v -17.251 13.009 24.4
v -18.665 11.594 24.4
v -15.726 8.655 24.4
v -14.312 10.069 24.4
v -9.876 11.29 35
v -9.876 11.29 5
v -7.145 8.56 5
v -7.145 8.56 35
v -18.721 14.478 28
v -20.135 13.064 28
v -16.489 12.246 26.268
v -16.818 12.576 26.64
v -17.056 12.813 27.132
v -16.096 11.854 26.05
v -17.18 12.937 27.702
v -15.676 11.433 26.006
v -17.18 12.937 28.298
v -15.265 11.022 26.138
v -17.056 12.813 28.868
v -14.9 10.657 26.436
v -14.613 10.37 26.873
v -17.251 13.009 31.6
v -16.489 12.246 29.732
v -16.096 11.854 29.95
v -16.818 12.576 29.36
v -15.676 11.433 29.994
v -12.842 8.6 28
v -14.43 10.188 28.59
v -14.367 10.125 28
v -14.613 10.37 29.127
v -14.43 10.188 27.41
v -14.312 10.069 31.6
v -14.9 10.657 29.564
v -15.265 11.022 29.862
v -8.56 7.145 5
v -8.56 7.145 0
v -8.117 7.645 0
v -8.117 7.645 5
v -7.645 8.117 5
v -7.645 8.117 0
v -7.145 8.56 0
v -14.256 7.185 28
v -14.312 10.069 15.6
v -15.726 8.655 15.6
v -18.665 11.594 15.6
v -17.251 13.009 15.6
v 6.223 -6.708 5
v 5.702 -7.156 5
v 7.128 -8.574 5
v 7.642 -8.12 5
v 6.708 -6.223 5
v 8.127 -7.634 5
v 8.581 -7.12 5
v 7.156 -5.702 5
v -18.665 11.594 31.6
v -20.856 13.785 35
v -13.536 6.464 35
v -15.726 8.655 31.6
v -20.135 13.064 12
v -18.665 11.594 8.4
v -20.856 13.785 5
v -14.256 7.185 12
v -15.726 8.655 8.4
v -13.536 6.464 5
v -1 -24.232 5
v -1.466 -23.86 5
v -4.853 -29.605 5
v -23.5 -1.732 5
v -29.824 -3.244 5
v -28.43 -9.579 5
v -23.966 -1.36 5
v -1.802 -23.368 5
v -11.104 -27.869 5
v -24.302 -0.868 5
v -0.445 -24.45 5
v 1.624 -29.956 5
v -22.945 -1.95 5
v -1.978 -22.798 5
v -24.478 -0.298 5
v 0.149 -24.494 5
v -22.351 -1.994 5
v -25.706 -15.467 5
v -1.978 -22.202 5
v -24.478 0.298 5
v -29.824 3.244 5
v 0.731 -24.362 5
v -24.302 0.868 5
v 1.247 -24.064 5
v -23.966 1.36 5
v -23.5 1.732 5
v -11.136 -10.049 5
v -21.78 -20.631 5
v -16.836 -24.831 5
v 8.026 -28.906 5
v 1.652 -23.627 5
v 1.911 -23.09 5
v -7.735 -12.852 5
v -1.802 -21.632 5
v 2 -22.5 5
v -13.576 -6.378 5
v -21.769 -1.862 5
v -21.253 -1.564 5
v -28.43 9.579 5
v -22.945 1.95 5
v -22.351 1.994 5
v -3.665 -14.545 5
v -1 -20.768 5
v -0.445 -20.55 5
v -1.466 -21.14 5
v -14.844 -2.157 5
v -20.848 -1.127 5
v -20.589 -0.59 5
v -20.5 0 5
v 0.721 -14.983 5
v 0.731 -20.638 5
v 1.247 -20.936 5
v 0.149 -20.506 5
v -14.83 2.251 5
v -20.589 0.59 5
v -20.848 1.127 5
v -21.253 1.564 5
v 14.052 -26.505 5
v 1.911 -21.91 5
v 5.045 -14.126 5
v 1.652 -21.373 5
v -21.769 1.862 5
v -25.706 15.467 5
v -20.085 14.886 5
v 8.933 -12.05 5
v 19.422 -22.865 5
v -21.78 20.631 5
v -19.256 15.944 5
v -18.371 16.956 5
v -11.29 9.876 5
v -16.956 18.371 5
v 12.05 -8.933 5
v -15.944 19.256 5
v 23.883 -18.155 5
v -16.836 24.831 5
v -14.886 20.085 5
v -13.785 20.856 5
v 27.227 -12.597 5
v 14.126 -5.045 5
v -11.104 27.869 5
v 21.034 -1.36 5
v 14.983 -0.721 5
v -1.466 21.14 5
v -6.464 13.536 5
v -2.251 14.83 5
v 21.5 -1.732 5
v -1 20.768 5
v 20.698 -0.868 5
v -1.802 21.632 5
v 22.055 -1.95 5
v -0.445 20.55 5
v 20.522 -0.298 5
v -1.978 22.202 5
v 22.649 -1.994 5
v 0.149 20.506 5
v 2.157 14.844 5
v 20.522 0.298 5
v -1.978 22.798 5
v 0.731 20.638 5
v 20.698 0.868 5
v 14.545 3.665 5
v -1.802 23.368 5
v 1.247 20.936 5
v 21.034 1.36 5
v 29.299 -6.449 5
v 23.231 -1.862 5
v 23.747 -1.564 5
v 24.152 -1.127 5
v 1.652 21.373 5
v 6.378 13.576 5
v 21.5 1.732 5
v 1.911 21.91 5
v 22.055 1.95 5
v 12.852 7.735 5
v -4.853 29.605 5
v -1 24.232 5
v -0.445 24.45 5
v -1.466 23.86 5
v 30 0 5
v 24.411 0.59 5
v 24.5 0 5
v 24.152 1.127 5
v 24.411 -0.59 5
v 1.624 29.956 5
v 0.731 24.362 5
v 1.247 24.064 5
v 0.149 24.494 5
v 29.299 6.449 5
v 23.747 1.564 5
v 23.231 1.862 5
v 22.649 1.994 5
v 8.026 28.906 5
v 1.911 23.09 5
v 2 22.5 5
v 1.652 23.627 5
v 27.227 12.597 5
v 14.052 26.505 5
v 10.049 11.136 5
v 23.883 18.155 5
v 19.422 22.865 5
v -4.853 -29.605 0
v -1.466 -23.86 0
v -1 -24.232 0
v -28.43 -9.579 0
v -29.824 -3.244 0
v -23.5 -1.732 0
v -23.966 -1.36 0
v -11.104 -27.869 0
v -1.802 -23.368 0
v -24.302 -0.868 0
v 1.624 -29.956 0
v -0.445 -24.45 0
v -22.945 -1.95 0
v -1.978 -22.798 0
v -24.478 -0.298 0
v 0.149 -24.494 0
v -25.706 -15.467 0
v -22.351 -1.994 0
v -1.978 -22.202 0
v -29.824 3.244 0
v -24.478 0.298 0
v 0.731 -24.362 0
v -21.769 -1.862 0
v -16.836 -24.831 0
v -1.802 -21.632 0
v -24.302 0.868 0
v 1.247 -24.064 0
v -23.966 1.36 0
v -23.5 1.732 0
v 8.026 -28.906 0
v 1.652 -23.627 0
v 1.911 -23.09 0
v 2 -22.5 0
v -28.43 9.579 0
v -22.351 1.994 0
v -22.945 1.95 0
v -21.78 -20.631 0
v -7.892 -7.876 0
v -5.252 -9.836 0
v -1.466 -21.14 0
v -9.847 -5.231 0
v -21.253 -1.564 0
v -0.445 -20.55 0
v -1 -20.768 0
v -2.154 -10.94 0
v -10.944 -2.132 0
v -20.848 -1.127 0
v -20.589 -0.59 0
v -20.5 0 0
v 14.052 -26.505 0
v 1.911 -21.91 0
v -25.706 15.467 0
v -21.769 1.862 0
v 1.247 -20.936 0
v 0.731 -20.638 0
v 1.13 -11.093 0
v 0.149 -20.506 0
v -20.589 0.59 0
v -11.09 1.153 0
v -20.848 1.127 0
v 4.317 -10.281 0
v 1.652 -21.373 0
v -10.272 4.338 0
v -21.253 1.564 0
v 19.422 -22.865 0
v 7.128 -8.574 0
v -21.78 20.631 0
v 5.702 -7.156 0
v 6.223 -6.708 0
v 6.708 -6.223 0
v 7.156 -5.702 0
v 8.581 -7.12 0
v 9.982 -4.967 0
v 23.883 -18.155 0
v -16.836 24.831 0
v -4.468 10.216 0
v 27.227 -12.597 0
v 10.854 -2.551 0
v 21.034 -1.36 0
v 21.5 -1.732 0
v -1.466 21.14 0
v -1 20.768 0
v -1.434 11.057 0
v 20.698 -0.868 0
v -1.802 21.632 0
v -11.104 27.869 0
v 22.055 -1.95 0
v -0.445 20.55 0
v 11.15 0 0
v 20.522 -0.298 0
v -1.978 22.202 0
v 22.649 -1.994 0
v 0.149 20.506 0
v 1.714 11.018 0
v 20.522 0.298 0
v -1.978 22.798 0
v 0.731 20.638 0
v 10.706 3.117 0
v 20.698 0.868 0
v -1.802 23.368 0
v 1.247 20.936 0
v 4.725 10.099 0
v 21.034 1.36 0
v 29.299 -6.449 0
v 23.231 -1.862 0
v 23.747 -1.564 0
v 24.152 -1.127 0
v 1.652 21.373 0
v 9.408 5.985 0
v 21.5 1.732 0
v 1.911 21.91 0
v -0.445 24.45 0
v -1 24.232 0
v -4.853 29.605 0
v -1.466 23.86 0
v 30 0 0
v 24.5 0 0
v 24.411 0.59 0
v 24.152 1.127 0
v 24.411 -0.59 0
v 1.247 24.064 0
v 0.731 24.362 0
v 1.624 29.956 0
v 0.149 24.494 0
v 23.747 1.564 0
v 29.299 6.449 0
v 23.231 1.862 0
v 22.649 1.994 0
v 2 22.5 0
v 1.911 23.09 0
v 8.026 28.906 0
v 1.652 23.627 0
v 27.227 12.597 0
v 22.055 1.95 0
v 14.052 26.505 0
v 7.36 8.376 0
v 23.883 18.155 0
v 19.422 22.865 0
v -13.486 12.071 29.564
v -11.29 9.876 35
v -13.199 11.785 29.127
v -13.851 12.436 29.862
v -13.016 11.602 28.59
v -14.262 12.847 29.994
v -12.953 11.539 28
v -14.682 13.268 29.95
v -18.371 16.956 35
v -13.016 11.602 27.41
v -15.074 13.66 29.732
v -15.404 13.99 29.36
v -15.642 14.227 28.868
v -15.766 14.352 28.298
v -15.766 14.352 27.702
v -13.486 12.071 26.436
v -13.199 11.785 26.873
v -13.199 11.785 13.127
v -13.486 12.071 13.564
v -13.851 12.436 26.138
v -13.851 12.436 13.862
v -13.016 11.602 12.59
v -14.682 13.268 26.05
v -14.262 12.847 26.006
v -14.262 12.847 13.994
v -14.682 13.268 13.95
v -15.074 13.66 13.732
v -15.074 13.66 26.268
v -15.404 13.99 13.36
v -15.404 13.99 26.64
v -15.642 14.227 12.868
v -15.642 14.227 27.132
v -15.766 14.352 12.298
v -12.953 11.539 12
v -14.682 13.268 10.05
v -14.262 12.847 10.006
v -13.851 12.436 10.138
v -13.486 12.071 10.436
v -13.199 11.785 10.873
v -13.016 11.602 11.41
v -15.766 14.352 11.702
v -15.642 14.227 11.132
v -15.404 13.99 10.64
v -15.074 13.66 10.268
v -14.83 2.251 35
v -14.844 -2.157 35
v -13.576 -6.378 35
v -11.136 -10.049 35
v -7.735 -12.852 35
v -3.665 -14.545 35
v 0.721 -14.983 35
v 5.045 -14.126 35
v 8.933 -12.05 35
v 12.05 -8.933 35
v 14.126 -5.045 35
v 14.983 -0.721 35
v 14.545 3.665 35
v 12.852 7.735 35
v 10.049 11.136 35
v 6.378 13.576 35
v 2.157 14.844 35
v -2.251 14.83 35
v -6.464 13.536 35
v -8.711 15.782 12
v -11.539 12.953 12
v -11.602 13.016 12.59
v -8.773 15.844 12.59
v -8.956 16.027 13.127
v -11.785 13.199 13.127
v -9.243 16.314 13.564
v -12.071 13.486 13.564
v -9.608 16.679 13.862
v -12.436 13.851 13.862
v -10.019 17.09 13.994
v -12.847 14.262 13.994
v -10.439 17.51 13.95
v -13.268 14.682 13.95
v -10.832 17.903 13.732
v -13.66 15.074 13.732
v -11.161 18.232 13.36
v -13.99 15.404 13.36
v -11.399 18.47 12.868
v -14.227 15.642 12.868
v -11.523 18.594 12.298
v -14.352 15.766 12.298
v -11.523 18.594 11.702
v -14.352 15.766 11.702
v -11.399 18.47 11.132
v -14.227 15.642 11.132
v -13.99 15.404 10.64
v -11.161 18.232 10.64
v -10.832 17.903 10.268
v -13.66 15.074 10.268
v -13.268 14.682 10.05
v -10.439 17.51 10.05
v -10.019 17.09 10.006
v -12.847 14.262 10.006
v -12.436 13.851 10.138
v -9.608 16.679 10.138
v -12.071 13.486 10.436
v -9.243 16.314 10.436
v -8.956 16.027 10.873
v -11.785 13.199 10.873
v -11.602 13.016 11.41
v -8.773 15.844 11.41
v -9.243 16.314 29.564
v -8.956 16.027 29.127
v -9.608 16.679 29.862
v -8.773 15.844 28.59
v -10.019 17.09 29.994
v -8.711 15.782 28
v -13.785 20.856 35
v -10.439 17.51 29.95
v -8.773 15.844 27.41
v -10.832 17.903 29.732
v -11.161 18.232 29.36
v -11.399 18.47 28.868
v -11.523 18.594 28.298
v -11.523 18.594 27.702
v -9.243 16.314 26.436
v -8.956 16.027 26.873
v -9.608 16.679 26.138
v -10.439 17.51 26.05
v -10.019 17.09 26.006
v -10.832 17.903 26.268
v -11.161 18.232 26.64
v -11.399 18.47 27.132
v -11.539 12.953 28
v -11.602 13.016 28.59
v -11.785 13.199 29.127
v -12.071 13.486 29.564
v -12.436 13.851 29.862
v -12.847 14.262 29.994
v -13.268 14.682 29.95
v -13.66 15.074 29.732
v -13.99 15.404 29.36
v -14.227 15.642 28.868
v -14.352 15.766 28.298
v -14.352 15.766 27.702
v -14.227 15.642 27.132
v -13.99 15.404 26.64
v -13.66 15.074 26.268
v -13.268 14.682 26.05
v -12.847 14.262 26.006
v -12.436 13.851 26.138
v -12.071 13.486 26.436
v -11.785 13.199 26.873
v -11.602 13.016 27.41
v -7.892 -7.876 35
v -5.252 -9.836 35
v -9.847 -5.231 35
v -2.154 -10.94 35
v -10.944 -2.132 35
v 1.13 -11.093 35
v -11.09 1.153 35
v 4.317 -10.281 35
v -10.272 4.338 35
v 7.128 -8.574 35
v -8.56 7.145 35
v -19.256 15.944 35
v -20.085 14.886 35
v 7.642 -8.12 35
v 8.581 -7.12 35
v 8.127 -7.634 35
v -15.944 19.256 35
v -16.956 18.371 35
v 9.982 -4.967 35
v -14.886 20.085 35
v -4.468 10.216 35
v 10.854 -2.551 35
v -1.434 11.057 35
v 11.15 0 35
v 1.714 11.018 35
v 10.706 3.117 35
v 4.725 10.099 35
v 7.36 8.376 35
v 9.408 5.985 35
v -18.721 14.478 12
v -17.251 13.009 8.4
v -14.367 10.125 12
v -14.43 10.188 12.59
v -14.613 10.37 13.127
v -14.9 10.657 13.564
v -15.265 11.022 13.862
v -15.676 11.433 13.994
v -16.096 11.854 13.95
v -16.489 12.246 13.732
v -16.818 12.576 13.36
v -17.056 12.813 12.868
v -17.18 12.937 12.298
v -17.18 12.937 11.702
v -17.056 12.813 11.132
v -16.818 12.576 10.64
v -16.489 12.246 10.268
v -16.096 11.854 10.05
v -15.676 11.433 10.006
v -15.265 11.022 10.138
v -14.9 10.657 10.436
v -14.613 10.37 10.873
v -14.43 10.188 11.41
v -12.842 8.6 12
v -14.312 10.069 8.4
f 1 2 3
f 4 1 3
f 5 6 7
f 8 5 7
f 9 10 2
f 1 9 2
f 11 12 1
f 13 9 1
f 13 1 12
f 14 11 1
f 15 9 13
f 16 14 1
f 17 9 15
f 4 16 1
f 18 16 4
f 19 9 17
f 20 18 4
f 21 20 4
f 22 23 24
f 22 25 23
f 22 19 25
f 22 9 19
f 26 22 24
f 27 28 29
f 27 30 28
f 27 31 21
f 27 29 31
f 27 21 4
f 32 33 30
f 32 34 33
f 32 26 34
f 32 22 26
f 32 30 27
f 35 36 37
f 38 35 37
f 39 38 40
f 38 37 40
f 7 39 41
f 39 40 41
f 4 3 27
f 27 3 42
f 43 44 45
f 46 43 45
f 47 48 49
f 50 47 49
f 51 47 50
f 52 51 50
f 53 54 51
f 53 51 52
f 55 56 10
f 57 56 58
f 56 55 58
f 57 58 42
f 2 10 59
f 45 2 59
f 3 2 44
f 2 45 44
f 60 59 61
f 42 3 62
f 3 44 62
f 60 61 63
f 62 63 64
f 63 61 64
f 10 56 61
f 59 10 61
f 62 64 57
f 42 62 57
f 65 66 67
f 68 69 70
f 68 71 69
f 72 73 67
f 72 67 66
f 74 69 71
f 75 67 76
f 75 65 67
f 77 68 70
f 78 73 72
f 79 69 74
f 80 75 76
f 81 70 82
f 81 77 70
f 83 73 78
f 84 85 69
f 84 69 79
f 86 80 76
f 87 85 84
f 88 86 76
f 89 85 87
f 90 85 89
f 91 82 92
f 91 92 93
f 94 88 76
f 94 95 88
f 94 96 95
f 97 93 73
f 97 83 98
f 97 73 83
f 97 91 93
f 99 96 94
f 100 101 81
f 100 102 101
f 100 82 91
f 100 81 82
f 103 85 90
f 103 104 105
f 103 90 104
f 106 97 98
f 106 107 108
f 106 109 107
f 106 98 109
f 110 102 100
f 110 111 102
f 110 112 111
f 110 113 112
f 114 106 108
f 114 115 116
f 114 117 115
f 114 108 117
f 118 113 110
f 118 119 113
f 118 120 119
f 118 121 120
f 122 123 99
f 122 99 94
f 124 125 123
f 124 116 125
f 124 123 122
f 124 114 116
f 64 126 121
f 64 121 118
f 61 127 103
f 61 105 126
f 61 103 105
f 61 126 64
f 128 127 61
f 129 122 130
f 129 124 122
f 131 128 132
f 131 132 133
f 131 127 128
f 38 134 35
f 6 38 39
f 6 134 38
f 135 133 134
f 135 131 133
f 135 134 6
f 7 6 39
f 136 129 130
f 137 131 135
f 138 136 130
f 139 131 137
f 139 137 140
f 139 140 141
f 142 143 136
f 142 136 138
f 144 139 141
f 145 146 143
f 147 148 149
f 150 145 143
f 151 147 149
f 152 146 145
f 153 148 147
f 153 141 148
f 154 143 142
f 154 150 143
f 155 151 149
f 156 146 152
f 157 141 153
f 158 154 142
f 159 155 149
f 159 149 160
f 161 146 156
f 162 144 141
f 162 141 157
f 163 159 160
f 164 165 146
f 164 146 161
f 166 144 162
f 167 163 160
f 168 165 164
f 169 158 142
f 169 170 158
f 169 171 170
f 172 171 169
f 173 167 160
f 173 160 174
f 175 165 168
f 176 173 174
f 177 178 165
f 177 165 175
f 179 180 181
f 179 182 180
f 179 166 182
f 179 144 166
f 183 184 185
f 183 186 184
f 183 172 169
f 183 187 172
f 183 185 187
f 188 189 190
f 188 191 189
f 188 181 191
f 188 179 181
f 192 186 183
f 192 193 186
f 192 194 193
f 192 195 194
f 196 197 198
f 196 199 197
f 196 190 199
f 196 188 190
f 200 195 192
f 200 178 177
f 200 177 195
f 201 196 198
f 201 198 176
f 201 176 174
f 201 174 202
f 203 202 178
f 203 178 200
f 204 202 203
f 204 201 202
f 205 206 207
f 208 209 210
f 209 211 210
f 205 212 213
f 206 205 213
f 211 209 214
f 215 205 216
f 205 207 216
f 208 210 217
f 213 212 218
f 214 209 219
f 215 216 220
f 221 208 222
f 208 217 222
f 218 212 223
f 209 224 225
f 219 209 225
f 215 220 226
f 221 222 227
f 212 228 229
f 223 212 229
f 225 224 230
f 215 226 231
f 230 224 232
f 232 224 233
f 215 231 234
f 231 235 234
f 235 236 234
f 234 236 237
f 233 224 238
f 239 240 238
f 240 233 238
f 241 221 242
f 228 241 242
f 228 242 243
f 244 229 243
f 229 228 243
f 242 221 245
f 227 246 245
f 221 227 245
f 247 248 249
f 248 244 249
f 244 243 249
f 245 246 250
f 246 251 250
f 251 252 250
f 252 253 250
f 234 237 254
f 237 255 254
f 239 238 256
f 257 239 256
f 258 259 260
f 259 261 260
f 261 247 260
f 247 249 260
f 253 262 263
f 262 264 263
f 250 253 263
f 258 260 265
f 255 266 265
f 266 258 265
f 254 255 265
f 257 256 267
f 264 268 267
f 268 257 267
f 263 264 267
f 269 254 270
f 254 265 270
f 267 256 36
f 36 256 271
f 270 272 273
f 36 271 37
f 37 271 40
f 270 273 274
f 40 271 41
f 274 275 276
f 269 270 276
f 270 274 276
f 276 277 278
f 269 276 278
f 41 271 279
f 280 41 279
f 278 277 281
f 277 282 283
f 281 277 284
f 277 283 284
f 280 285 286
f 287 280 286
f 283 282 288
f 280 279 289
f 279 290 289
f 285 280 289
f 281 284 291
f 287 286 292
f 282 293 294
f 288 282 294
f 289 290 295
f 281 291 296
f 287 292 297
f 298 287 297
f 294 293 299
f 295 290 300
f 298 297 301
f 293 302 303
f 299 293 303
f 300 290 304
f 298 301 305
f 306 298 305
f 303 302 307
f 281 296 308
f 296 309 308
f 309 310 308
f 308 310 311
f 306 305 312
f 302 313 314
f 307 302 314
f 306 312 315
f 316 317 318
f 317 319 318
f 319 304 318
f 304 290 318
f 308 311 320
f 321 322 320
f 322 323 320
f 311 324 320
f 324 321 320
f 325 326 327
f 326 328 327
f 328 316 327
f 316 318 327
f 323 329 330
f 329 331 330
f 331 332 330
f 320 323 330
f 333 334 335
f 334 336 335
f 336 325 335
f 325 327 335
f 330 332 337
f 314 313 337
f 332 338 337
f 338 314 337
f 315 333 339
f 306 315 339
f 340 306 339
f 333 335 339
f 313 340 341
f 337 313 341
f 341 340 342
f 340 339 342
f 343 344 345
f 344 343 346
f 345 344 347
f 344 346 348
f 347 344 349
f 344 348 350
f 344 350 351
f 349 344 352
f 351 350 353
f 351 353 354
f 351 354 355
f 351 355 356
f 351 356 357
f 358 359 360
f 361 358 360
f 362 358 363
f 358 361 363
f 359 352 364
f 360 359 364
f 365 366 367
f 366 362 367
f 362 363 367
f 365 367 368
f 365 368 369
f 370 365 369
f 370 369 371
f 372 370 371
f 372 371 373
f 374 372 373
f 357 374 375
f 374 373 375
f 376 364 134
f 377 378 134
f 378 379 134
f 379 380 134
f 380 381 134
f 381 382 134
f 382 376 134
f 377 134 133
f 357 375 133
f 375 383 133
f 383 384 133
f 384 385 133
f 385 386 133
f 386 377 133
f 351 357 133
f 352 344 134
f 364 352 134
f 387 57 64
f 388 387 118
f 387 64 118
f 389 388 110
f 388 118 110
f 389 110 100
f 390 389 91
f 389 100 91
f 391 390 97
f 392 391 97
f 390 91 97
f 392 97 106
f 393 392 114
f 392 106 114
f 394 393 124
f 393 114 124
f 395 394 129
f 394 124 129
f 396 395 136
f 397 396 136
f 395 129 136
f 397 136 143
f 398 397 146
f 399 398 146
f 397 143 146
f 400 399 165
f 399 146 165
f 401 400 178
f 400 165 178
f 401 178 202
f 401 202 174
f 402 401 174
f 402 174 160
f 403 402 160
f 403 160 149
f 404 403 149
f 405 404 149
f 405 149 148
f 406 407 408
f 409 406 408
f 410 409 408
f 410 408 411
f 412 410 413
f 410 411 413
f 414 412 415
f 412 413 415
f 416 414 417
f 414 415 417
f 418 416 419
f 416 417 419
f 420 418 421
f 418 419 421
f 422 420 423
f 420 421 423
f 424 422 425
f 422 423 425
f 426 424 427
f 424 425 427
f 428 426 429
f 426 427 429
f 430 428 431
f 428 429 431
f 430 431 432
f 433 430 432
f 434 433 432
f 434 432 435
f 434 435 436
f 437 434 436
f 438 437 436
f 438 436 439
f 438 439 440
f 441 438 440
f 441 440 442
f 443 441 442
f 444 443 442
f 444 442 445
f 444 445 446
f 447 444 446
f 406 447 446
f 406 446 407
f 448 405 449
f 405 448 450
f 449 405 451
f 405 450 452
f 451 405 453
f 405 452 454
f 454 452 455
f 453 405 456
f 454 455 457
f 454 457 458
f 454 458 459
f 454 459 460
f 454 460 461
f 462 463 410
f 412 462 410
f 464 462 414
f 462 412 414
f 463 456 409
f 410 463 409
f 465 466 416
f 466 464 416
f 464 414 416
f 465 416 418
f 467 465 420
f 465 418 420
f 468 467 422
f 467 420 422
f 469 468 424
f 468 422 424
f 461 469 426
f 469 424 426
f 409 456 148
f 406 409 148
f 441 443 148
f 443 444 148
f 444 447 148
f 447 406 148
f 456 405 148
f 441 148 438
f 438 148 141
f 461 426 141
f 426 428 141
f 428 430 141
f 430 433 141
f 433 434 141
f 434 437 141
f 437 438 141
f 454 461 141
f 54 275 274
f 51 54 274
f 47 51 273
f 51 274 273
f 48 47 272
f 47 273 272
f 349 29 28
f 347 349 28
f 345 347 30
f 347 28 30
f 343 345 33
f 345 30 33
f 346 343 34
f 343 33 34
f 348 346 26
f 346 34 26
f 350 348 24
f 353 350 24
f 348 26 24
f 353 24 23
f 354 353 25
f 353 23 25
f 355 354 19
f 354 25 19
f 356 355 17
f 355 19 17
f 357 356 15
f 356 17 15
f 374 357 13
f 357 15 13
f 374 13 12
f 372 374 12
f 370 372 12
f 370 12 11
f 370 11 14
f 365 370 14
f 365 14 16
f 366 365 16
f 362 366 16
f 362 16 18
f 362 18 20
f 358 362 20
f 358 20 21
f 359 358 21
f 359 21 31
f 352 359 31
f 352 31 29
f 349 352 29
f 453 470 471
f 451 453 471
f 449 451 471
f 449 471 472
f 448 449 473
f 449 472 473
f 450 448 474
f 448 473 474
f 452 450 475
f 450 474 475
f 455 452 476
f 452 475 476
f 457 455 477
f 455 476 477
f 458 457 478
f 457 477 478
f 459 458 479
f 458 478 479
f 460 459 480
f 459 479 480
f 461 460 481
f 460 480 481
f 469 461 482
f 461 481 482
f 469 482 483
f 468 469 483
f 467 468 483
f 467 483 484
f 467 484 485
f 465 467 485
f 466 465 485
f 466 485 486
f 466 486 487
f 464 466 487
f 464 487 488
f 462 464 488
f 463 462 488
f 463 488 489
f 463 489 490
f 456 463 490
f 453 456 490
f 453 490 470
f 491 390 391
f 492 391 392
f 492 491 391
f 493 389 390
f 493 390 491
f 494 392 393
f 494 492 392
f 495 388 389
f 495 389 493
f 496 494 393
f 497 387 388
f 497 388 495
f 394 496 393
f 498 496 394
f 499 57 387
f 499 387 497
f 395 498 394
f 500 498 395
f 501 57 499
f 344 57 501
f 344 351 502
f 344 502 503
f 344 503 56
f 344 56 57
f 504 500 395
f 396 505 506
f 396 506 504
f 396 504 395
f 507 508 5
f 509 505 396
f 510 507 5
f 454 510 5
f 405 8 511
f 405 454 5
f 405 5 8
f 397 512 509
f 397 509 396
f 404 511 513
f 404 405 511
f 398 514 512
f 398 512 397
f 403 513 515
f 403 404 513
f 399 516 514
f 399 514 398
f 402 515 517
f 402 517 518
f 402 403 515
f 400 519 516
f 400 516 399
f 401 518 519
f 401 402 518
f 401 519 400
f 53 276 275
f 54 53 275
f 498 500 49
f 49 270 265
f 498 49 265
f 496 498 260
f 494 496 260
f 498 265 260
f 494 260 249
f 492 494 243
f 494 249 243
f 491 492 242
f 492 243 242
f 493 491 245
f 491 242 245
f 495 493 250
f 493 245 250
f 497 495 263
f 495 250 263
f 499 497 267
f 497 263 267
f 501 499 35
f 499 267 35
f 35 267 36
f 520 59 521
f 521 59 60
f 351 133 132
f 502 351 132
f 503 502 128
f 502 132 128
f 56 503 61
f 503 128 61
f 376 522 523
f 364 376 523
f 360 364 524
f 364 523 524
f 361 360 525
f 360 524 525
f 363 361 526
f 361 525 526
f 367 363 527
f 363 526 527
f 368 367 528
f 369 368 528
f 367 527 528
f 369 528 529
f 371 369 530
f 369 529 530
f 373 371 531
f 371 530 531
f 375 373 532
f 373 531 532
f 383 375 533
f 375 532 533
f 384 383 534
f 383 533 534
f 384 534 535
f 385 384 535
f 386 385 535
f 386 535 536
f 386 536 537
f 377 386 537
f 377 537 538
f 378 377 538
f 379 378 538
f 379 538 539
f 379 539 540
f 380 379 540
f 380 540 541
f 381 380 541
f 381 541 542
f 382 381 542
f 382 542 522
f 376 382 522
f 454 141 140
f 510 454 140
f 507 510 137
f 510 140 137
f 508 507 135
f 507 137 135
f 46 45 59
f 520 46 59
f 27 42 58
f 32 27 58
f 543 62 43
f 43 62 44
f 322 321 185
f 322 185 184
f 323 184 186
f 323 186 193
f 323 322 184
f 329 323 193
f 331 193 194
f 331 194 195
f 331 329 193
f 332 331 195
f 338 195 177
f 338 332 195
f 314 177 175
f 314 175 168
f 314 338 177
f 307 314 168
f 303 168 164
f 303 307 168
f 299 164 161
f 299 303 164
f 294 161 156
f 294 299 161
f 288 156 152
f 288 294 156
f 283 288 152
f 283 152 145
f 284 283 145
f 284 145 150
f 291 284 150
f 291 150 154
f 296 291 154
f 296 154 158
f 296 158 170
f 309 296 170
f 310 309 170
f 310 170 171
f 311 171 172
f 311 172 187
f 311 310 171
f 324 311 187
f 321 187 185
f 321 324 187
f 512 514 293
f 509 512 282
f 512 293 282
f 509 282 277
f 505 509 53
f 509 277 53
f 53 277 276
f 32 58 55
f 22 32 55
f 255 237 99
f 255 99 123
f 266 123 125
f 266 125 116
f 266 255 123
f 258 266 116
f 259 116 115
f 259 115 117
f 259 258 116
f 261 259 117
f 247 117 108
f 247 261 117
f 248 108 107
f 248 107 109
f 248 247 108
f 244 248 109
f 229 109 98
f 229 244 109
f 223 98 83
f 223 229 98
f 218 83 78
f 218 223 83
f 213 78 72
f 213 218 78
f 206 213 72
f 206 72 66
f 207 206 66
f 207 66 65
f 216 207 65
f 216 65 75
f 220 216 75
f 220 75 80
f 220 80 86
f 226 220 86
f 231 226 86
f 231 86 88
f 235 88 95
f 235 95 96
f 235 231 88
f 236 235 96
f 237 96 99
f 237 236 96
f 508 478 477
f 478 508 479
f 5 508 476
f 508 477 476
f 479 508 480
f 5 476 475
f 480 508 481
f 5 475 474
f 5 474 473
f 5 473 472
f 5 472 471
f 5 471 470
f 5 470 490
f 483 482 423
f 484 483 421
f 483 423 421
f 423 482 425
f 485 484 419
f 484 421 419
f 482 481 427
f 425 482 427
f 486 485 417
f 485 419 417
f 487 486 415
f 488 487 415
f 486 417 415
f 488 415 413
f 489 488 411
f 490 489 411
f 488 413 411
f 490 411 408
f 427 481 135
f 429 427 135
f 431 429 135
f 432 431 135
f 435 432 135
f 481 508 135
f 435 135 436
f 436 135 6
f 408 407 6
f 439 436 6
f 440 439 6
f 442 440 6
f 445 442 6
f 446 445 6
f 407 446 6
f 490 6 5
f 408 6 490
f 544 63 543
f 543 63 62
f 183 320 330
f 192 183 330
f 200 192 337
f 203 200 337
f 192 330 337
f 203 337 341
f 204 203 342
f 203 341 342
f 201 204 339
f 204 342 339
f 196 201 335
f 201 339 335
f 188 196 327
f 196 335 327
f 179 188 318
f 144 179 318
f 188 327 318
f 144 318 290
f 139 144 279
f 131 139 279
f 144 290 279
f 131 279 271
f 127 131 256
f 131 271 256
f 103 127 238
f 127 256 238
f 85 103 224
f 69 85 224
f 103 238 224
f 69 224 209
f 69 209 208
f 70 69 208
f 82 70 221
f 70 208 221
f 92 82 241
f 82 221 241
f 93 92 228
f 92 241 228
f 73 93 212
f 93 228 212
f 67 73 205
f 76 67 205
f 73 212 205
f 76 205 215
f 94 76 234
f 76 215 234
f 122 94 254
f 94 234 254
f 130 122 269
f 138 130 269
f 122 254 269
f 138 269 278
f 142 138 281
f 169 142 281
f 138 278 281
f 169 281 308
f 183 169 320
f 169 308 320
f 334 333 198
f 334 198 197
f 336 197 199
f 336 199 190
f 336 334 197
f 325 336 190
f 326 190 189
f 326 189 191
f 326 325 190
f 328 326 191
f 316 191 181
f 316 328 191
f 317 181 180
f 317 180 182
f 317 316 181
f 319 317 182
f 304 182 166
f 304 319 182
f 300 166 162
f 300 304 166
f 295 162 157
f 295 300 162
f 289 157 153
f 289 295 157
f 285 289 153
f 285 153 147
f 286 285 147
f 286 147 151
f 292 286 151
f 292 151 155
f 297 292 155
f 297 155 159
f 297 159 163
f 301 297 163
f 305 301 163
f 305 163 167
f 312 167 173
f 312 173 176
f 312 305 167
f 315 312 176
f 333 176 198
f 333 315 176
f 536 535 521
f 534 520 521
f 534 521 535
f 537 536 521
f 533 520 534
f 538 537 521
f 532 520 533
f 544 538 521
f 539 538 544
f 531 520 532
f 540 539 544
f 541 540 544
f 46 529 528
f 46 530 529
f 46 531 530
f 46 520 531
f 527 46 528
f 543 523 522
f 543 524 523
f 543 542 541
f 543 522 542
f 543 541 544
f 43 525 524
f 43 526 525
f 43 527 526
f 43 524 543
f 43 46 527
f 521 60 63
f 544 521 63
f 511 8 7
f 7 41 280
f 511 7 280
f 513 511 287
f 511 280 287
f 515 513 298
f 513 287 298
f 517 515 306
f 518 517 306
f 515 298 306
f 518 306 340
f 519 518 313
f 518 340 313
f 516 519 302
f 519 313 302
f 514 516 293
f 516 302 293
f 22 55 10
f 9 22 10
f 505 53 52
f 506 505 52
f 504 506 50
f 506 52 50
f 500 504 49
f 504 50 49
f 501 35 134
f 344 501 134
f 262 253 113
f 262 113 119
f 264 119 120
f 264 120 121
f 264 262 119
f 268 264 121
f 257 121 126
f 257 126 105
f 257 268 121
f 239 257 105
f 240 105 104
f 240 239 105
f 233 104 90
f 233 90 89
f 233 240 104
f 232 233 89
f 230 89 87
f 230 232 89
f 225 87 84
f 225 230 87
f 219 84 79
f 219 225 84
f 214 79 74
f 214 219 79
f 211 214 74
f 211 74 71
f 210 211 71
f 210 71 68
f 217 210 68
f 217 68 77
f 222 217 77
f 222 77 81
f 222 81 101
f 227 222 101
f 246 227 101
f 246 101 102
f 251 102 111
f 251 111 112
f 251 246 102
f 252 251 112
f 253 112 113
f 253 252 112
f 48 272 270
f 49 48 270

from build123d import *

# Parameters (mm, degrees)
F1_DEPTH = 35
F0_R     = 30
F0_R_2   = 2
F2_DEPTH = 5
F4_R     = 2
F5_DEPTH = 11
F6_DEPTH = 2


with BuildPart() as f1:
    # F0 (on Top) → F1 (new body)
    with BuildSketch(Plane.XY):
        with BuildLine():
            ThreePointArc((-7.1453609838, 8.5595745462), (4.7250251338, 10.0993384677), (11.15, 0))
            ThreePointArc((11.15, 0), (10.4880847772, -3.7845181605), (8.5809277655, -7.119703553))
            ThreePointArc((8.5809277655, -7.119703553), (7.8878989891, -7.880580533), (7.1276656329, -8.5743152861))
            ThreePointArc((7.1276656329, -8.5743152861), (-7.8923790008, -7.8760938103), (-8.5595745462, 7.1453609838))
            Line((-8.5595745462, 7.1453609838), (-11.2901120254, 9.8758984631))
            ThreePointArc((-11.2901120254, 9.8758984631), (-12.5294709258, 8.2469605504), (-13.5355339059, 6.4644660941))
            ThreePointArc((-13.5355339059, 6.4644660941), (10.6066017178, -10.6066017178), (-6.4644660941, 13.5355339059))
            ThreePointArc((-6.4644660941, 13.5355339059), (-8.2469605504, 12.5294709258), (-9.8758984631, 11.2901120254))
            Line((-9.8758984631, 11.2901120254), (-7.1453609838, 8.5595745462))
        make_face()
        with BuildLine():
            ThreePointArc((-13.5355339059, 6.4644660941), (-12.5294709258, 8.2469605504), (-11.2901120254, 9.8758984631))
            Line((-11.2901120254, 9.8758984631), (-18.3706285138, 16.9564149515))
            ThreePointArc((-18.3706285138, 16.9564149515), (-19.6773328655, 15.4208485922), (-20.8560419816, 13.7849741698))
            Line((-20.8560419816, 13.7849741698), (-13.5355339059, 6.4644660941))
        make_face()
        with BuildLine():
            Line((-16.9564149515, 18.3706285138), (-9.8758984631, 11.2901120254))
            ThreePointArc((-9.8758984631, 11.2901120254), (-8.2469605504, 12.5294709258), (-6.4644660941, 13.5355339059))
            Line((-6.4644660941, 13.5355339059), (-13.7849741698, 20.8560419816))
            ThreePointArc((-13.7849741698, 20.8560419816), (-15.4208485922, 19.6773328655), (-16.9564149515, 18.3706285138))
        make_face()
    extrude(amount=F1_DEPTH)

    # F0 (on Top) → F2 (join)
    with BuildSketch(Plane.XY):
        Circle(F0_R)
        with Locations((0, -22.5)):
            Circle(F0_R_2, mode=Mode.SUBTRACT)
        with Locations((-22.5, 0)):
            Circle(F0_R_2, mode=Mode.SUBTRACT)
        with BuildLine():
            Line((-13.7849741698, 20.8560419816), (-6.4644660941, 13.5355339059))
            ThreePointArc((-6.4644660941, 13.5355339059), (10.6066017178, -10.6066017178), (-13.5355339059, 6.4644660941))
            Line((-13.5355339059, 6.4644660941), (-20.8560419816, 13.7849741698))
            ThreePointArc((-20.8560419816, 13.7849741698), (-19.6773328655, 15.4208485922), (-18.3706285138, 16.9564149515))
            ThreePointArc((-18.3706285138, 16.9564149515), (-17.6776695297, 17.6776695297), (-16.9564149515, 18.3706285138))
            ThreePointArc((-16.9564149515, 18.3706285138), (-15.4208485922, 19.6773328655), (-13.7849741698, 20.8560419816))
        make_face(mode=Mode.SUBTRACT)
        with Locations((22.5, 0)):
            Circle(F0_R_2, mode=Mode.SUBTRACT)
        with Locations((0, 22.5)):
            Circle(F0_R_2, mode=Mode.SUBTRACT)
        with BuildLine():
            ThreePointArc((7.1276656329, -8.5743152861), (7.8878989891, -7.880580533), (8.5809277655, -7.119703553))
            Line((8.5809277655, -7.119703553), (7.1560256843, -5.7020870219))
            ThreePointArc((7.1560256843, -5.7020870219), (6.4700270479, -6.4700270479), (5.7020870219, -7.1560256843))
            Line((5.7020870219, -7.1560256843), (7.1276656329, -8.5743152861))
        make_face()
        with BuildLine():
            ThreePointArc((-8.5595745462, 7.1453609838), (-7.8842406102, 7.8842406102), (-7.1453609838, 8.5595745462))
            Line((-7.1453609838, 8.5595745462), (-9.8758984631, 11.2901120254))
            Line((-9.8758984631, 11.2901120254), (-16.9564149515, 18.3706285138))
            ThreePointArc((-16.9564149515, 18.3706285138), (-17.6776695297, 17.6776695297), (-18.3706285138, 16.9564149515))
            Line((-18.3706285138, 16.9564149515), (-11.2901120254, 9.8758984631))
            Line((-11.2901120254, 9.8758984631), (-8.5595745462, 7.1453609838))
        make_face()
    extrude(amount=F2_DEPTH)

    # F4 (on offset) → F5 (cut)
    with BuildSketch(Plane(origin=(-3.5355339059, -3.5355339059, 0), x_dir=(0.7071067812, -0.7071067812, 0), z_dir=(-0.7071067812, -0.7071067812, 0))):
        with Locations((-19.3185165258, 28)):
            Circle(F4_R)
        with Locations((-19.3185165258, 12)):
            Circle(F4_R)
    extrude(amount=-F5_DEPTH, mode=Mode.SUBTRACT)

    # F4 (on offset) → F6 (cut)
    with BuildSketch(Plane(origin=(-3.5355339059, -3.5355339059, 0), x_dir=(0.7071067812, -0.7071067812, 0), z_dir=(-0.7071067812, -0.7071067812, 0))):
        Polygon((-17.2400555567, 31.6), (-21.3969774949, 31.6), (-23.4754384639, 28), (-21.3969774949, 24.4), (-17.2400555567, 24.4), (-15.1615945876, 28), align=None)
        with Locations((-19.3185165258, 28)):
            Circle(F4_R, mode=Mode.SUBTRACT)
        Polygon((-17.2400555567, 15.6), (-21.3969774949, 15.6), (-23.4754384639, 12), (-21.3969774949, 8.4), (-17.2400555567, 8.4), (-15.1615945876, 12), align=None)
        with Locations((-19.3185165258, 12)):
            Circle(F4_R, mode=Mode.SUBTRACT)
    extrude(amount=-F6_DEPTH, mode=Mode.SUBTRACT)


solid = f1.part
